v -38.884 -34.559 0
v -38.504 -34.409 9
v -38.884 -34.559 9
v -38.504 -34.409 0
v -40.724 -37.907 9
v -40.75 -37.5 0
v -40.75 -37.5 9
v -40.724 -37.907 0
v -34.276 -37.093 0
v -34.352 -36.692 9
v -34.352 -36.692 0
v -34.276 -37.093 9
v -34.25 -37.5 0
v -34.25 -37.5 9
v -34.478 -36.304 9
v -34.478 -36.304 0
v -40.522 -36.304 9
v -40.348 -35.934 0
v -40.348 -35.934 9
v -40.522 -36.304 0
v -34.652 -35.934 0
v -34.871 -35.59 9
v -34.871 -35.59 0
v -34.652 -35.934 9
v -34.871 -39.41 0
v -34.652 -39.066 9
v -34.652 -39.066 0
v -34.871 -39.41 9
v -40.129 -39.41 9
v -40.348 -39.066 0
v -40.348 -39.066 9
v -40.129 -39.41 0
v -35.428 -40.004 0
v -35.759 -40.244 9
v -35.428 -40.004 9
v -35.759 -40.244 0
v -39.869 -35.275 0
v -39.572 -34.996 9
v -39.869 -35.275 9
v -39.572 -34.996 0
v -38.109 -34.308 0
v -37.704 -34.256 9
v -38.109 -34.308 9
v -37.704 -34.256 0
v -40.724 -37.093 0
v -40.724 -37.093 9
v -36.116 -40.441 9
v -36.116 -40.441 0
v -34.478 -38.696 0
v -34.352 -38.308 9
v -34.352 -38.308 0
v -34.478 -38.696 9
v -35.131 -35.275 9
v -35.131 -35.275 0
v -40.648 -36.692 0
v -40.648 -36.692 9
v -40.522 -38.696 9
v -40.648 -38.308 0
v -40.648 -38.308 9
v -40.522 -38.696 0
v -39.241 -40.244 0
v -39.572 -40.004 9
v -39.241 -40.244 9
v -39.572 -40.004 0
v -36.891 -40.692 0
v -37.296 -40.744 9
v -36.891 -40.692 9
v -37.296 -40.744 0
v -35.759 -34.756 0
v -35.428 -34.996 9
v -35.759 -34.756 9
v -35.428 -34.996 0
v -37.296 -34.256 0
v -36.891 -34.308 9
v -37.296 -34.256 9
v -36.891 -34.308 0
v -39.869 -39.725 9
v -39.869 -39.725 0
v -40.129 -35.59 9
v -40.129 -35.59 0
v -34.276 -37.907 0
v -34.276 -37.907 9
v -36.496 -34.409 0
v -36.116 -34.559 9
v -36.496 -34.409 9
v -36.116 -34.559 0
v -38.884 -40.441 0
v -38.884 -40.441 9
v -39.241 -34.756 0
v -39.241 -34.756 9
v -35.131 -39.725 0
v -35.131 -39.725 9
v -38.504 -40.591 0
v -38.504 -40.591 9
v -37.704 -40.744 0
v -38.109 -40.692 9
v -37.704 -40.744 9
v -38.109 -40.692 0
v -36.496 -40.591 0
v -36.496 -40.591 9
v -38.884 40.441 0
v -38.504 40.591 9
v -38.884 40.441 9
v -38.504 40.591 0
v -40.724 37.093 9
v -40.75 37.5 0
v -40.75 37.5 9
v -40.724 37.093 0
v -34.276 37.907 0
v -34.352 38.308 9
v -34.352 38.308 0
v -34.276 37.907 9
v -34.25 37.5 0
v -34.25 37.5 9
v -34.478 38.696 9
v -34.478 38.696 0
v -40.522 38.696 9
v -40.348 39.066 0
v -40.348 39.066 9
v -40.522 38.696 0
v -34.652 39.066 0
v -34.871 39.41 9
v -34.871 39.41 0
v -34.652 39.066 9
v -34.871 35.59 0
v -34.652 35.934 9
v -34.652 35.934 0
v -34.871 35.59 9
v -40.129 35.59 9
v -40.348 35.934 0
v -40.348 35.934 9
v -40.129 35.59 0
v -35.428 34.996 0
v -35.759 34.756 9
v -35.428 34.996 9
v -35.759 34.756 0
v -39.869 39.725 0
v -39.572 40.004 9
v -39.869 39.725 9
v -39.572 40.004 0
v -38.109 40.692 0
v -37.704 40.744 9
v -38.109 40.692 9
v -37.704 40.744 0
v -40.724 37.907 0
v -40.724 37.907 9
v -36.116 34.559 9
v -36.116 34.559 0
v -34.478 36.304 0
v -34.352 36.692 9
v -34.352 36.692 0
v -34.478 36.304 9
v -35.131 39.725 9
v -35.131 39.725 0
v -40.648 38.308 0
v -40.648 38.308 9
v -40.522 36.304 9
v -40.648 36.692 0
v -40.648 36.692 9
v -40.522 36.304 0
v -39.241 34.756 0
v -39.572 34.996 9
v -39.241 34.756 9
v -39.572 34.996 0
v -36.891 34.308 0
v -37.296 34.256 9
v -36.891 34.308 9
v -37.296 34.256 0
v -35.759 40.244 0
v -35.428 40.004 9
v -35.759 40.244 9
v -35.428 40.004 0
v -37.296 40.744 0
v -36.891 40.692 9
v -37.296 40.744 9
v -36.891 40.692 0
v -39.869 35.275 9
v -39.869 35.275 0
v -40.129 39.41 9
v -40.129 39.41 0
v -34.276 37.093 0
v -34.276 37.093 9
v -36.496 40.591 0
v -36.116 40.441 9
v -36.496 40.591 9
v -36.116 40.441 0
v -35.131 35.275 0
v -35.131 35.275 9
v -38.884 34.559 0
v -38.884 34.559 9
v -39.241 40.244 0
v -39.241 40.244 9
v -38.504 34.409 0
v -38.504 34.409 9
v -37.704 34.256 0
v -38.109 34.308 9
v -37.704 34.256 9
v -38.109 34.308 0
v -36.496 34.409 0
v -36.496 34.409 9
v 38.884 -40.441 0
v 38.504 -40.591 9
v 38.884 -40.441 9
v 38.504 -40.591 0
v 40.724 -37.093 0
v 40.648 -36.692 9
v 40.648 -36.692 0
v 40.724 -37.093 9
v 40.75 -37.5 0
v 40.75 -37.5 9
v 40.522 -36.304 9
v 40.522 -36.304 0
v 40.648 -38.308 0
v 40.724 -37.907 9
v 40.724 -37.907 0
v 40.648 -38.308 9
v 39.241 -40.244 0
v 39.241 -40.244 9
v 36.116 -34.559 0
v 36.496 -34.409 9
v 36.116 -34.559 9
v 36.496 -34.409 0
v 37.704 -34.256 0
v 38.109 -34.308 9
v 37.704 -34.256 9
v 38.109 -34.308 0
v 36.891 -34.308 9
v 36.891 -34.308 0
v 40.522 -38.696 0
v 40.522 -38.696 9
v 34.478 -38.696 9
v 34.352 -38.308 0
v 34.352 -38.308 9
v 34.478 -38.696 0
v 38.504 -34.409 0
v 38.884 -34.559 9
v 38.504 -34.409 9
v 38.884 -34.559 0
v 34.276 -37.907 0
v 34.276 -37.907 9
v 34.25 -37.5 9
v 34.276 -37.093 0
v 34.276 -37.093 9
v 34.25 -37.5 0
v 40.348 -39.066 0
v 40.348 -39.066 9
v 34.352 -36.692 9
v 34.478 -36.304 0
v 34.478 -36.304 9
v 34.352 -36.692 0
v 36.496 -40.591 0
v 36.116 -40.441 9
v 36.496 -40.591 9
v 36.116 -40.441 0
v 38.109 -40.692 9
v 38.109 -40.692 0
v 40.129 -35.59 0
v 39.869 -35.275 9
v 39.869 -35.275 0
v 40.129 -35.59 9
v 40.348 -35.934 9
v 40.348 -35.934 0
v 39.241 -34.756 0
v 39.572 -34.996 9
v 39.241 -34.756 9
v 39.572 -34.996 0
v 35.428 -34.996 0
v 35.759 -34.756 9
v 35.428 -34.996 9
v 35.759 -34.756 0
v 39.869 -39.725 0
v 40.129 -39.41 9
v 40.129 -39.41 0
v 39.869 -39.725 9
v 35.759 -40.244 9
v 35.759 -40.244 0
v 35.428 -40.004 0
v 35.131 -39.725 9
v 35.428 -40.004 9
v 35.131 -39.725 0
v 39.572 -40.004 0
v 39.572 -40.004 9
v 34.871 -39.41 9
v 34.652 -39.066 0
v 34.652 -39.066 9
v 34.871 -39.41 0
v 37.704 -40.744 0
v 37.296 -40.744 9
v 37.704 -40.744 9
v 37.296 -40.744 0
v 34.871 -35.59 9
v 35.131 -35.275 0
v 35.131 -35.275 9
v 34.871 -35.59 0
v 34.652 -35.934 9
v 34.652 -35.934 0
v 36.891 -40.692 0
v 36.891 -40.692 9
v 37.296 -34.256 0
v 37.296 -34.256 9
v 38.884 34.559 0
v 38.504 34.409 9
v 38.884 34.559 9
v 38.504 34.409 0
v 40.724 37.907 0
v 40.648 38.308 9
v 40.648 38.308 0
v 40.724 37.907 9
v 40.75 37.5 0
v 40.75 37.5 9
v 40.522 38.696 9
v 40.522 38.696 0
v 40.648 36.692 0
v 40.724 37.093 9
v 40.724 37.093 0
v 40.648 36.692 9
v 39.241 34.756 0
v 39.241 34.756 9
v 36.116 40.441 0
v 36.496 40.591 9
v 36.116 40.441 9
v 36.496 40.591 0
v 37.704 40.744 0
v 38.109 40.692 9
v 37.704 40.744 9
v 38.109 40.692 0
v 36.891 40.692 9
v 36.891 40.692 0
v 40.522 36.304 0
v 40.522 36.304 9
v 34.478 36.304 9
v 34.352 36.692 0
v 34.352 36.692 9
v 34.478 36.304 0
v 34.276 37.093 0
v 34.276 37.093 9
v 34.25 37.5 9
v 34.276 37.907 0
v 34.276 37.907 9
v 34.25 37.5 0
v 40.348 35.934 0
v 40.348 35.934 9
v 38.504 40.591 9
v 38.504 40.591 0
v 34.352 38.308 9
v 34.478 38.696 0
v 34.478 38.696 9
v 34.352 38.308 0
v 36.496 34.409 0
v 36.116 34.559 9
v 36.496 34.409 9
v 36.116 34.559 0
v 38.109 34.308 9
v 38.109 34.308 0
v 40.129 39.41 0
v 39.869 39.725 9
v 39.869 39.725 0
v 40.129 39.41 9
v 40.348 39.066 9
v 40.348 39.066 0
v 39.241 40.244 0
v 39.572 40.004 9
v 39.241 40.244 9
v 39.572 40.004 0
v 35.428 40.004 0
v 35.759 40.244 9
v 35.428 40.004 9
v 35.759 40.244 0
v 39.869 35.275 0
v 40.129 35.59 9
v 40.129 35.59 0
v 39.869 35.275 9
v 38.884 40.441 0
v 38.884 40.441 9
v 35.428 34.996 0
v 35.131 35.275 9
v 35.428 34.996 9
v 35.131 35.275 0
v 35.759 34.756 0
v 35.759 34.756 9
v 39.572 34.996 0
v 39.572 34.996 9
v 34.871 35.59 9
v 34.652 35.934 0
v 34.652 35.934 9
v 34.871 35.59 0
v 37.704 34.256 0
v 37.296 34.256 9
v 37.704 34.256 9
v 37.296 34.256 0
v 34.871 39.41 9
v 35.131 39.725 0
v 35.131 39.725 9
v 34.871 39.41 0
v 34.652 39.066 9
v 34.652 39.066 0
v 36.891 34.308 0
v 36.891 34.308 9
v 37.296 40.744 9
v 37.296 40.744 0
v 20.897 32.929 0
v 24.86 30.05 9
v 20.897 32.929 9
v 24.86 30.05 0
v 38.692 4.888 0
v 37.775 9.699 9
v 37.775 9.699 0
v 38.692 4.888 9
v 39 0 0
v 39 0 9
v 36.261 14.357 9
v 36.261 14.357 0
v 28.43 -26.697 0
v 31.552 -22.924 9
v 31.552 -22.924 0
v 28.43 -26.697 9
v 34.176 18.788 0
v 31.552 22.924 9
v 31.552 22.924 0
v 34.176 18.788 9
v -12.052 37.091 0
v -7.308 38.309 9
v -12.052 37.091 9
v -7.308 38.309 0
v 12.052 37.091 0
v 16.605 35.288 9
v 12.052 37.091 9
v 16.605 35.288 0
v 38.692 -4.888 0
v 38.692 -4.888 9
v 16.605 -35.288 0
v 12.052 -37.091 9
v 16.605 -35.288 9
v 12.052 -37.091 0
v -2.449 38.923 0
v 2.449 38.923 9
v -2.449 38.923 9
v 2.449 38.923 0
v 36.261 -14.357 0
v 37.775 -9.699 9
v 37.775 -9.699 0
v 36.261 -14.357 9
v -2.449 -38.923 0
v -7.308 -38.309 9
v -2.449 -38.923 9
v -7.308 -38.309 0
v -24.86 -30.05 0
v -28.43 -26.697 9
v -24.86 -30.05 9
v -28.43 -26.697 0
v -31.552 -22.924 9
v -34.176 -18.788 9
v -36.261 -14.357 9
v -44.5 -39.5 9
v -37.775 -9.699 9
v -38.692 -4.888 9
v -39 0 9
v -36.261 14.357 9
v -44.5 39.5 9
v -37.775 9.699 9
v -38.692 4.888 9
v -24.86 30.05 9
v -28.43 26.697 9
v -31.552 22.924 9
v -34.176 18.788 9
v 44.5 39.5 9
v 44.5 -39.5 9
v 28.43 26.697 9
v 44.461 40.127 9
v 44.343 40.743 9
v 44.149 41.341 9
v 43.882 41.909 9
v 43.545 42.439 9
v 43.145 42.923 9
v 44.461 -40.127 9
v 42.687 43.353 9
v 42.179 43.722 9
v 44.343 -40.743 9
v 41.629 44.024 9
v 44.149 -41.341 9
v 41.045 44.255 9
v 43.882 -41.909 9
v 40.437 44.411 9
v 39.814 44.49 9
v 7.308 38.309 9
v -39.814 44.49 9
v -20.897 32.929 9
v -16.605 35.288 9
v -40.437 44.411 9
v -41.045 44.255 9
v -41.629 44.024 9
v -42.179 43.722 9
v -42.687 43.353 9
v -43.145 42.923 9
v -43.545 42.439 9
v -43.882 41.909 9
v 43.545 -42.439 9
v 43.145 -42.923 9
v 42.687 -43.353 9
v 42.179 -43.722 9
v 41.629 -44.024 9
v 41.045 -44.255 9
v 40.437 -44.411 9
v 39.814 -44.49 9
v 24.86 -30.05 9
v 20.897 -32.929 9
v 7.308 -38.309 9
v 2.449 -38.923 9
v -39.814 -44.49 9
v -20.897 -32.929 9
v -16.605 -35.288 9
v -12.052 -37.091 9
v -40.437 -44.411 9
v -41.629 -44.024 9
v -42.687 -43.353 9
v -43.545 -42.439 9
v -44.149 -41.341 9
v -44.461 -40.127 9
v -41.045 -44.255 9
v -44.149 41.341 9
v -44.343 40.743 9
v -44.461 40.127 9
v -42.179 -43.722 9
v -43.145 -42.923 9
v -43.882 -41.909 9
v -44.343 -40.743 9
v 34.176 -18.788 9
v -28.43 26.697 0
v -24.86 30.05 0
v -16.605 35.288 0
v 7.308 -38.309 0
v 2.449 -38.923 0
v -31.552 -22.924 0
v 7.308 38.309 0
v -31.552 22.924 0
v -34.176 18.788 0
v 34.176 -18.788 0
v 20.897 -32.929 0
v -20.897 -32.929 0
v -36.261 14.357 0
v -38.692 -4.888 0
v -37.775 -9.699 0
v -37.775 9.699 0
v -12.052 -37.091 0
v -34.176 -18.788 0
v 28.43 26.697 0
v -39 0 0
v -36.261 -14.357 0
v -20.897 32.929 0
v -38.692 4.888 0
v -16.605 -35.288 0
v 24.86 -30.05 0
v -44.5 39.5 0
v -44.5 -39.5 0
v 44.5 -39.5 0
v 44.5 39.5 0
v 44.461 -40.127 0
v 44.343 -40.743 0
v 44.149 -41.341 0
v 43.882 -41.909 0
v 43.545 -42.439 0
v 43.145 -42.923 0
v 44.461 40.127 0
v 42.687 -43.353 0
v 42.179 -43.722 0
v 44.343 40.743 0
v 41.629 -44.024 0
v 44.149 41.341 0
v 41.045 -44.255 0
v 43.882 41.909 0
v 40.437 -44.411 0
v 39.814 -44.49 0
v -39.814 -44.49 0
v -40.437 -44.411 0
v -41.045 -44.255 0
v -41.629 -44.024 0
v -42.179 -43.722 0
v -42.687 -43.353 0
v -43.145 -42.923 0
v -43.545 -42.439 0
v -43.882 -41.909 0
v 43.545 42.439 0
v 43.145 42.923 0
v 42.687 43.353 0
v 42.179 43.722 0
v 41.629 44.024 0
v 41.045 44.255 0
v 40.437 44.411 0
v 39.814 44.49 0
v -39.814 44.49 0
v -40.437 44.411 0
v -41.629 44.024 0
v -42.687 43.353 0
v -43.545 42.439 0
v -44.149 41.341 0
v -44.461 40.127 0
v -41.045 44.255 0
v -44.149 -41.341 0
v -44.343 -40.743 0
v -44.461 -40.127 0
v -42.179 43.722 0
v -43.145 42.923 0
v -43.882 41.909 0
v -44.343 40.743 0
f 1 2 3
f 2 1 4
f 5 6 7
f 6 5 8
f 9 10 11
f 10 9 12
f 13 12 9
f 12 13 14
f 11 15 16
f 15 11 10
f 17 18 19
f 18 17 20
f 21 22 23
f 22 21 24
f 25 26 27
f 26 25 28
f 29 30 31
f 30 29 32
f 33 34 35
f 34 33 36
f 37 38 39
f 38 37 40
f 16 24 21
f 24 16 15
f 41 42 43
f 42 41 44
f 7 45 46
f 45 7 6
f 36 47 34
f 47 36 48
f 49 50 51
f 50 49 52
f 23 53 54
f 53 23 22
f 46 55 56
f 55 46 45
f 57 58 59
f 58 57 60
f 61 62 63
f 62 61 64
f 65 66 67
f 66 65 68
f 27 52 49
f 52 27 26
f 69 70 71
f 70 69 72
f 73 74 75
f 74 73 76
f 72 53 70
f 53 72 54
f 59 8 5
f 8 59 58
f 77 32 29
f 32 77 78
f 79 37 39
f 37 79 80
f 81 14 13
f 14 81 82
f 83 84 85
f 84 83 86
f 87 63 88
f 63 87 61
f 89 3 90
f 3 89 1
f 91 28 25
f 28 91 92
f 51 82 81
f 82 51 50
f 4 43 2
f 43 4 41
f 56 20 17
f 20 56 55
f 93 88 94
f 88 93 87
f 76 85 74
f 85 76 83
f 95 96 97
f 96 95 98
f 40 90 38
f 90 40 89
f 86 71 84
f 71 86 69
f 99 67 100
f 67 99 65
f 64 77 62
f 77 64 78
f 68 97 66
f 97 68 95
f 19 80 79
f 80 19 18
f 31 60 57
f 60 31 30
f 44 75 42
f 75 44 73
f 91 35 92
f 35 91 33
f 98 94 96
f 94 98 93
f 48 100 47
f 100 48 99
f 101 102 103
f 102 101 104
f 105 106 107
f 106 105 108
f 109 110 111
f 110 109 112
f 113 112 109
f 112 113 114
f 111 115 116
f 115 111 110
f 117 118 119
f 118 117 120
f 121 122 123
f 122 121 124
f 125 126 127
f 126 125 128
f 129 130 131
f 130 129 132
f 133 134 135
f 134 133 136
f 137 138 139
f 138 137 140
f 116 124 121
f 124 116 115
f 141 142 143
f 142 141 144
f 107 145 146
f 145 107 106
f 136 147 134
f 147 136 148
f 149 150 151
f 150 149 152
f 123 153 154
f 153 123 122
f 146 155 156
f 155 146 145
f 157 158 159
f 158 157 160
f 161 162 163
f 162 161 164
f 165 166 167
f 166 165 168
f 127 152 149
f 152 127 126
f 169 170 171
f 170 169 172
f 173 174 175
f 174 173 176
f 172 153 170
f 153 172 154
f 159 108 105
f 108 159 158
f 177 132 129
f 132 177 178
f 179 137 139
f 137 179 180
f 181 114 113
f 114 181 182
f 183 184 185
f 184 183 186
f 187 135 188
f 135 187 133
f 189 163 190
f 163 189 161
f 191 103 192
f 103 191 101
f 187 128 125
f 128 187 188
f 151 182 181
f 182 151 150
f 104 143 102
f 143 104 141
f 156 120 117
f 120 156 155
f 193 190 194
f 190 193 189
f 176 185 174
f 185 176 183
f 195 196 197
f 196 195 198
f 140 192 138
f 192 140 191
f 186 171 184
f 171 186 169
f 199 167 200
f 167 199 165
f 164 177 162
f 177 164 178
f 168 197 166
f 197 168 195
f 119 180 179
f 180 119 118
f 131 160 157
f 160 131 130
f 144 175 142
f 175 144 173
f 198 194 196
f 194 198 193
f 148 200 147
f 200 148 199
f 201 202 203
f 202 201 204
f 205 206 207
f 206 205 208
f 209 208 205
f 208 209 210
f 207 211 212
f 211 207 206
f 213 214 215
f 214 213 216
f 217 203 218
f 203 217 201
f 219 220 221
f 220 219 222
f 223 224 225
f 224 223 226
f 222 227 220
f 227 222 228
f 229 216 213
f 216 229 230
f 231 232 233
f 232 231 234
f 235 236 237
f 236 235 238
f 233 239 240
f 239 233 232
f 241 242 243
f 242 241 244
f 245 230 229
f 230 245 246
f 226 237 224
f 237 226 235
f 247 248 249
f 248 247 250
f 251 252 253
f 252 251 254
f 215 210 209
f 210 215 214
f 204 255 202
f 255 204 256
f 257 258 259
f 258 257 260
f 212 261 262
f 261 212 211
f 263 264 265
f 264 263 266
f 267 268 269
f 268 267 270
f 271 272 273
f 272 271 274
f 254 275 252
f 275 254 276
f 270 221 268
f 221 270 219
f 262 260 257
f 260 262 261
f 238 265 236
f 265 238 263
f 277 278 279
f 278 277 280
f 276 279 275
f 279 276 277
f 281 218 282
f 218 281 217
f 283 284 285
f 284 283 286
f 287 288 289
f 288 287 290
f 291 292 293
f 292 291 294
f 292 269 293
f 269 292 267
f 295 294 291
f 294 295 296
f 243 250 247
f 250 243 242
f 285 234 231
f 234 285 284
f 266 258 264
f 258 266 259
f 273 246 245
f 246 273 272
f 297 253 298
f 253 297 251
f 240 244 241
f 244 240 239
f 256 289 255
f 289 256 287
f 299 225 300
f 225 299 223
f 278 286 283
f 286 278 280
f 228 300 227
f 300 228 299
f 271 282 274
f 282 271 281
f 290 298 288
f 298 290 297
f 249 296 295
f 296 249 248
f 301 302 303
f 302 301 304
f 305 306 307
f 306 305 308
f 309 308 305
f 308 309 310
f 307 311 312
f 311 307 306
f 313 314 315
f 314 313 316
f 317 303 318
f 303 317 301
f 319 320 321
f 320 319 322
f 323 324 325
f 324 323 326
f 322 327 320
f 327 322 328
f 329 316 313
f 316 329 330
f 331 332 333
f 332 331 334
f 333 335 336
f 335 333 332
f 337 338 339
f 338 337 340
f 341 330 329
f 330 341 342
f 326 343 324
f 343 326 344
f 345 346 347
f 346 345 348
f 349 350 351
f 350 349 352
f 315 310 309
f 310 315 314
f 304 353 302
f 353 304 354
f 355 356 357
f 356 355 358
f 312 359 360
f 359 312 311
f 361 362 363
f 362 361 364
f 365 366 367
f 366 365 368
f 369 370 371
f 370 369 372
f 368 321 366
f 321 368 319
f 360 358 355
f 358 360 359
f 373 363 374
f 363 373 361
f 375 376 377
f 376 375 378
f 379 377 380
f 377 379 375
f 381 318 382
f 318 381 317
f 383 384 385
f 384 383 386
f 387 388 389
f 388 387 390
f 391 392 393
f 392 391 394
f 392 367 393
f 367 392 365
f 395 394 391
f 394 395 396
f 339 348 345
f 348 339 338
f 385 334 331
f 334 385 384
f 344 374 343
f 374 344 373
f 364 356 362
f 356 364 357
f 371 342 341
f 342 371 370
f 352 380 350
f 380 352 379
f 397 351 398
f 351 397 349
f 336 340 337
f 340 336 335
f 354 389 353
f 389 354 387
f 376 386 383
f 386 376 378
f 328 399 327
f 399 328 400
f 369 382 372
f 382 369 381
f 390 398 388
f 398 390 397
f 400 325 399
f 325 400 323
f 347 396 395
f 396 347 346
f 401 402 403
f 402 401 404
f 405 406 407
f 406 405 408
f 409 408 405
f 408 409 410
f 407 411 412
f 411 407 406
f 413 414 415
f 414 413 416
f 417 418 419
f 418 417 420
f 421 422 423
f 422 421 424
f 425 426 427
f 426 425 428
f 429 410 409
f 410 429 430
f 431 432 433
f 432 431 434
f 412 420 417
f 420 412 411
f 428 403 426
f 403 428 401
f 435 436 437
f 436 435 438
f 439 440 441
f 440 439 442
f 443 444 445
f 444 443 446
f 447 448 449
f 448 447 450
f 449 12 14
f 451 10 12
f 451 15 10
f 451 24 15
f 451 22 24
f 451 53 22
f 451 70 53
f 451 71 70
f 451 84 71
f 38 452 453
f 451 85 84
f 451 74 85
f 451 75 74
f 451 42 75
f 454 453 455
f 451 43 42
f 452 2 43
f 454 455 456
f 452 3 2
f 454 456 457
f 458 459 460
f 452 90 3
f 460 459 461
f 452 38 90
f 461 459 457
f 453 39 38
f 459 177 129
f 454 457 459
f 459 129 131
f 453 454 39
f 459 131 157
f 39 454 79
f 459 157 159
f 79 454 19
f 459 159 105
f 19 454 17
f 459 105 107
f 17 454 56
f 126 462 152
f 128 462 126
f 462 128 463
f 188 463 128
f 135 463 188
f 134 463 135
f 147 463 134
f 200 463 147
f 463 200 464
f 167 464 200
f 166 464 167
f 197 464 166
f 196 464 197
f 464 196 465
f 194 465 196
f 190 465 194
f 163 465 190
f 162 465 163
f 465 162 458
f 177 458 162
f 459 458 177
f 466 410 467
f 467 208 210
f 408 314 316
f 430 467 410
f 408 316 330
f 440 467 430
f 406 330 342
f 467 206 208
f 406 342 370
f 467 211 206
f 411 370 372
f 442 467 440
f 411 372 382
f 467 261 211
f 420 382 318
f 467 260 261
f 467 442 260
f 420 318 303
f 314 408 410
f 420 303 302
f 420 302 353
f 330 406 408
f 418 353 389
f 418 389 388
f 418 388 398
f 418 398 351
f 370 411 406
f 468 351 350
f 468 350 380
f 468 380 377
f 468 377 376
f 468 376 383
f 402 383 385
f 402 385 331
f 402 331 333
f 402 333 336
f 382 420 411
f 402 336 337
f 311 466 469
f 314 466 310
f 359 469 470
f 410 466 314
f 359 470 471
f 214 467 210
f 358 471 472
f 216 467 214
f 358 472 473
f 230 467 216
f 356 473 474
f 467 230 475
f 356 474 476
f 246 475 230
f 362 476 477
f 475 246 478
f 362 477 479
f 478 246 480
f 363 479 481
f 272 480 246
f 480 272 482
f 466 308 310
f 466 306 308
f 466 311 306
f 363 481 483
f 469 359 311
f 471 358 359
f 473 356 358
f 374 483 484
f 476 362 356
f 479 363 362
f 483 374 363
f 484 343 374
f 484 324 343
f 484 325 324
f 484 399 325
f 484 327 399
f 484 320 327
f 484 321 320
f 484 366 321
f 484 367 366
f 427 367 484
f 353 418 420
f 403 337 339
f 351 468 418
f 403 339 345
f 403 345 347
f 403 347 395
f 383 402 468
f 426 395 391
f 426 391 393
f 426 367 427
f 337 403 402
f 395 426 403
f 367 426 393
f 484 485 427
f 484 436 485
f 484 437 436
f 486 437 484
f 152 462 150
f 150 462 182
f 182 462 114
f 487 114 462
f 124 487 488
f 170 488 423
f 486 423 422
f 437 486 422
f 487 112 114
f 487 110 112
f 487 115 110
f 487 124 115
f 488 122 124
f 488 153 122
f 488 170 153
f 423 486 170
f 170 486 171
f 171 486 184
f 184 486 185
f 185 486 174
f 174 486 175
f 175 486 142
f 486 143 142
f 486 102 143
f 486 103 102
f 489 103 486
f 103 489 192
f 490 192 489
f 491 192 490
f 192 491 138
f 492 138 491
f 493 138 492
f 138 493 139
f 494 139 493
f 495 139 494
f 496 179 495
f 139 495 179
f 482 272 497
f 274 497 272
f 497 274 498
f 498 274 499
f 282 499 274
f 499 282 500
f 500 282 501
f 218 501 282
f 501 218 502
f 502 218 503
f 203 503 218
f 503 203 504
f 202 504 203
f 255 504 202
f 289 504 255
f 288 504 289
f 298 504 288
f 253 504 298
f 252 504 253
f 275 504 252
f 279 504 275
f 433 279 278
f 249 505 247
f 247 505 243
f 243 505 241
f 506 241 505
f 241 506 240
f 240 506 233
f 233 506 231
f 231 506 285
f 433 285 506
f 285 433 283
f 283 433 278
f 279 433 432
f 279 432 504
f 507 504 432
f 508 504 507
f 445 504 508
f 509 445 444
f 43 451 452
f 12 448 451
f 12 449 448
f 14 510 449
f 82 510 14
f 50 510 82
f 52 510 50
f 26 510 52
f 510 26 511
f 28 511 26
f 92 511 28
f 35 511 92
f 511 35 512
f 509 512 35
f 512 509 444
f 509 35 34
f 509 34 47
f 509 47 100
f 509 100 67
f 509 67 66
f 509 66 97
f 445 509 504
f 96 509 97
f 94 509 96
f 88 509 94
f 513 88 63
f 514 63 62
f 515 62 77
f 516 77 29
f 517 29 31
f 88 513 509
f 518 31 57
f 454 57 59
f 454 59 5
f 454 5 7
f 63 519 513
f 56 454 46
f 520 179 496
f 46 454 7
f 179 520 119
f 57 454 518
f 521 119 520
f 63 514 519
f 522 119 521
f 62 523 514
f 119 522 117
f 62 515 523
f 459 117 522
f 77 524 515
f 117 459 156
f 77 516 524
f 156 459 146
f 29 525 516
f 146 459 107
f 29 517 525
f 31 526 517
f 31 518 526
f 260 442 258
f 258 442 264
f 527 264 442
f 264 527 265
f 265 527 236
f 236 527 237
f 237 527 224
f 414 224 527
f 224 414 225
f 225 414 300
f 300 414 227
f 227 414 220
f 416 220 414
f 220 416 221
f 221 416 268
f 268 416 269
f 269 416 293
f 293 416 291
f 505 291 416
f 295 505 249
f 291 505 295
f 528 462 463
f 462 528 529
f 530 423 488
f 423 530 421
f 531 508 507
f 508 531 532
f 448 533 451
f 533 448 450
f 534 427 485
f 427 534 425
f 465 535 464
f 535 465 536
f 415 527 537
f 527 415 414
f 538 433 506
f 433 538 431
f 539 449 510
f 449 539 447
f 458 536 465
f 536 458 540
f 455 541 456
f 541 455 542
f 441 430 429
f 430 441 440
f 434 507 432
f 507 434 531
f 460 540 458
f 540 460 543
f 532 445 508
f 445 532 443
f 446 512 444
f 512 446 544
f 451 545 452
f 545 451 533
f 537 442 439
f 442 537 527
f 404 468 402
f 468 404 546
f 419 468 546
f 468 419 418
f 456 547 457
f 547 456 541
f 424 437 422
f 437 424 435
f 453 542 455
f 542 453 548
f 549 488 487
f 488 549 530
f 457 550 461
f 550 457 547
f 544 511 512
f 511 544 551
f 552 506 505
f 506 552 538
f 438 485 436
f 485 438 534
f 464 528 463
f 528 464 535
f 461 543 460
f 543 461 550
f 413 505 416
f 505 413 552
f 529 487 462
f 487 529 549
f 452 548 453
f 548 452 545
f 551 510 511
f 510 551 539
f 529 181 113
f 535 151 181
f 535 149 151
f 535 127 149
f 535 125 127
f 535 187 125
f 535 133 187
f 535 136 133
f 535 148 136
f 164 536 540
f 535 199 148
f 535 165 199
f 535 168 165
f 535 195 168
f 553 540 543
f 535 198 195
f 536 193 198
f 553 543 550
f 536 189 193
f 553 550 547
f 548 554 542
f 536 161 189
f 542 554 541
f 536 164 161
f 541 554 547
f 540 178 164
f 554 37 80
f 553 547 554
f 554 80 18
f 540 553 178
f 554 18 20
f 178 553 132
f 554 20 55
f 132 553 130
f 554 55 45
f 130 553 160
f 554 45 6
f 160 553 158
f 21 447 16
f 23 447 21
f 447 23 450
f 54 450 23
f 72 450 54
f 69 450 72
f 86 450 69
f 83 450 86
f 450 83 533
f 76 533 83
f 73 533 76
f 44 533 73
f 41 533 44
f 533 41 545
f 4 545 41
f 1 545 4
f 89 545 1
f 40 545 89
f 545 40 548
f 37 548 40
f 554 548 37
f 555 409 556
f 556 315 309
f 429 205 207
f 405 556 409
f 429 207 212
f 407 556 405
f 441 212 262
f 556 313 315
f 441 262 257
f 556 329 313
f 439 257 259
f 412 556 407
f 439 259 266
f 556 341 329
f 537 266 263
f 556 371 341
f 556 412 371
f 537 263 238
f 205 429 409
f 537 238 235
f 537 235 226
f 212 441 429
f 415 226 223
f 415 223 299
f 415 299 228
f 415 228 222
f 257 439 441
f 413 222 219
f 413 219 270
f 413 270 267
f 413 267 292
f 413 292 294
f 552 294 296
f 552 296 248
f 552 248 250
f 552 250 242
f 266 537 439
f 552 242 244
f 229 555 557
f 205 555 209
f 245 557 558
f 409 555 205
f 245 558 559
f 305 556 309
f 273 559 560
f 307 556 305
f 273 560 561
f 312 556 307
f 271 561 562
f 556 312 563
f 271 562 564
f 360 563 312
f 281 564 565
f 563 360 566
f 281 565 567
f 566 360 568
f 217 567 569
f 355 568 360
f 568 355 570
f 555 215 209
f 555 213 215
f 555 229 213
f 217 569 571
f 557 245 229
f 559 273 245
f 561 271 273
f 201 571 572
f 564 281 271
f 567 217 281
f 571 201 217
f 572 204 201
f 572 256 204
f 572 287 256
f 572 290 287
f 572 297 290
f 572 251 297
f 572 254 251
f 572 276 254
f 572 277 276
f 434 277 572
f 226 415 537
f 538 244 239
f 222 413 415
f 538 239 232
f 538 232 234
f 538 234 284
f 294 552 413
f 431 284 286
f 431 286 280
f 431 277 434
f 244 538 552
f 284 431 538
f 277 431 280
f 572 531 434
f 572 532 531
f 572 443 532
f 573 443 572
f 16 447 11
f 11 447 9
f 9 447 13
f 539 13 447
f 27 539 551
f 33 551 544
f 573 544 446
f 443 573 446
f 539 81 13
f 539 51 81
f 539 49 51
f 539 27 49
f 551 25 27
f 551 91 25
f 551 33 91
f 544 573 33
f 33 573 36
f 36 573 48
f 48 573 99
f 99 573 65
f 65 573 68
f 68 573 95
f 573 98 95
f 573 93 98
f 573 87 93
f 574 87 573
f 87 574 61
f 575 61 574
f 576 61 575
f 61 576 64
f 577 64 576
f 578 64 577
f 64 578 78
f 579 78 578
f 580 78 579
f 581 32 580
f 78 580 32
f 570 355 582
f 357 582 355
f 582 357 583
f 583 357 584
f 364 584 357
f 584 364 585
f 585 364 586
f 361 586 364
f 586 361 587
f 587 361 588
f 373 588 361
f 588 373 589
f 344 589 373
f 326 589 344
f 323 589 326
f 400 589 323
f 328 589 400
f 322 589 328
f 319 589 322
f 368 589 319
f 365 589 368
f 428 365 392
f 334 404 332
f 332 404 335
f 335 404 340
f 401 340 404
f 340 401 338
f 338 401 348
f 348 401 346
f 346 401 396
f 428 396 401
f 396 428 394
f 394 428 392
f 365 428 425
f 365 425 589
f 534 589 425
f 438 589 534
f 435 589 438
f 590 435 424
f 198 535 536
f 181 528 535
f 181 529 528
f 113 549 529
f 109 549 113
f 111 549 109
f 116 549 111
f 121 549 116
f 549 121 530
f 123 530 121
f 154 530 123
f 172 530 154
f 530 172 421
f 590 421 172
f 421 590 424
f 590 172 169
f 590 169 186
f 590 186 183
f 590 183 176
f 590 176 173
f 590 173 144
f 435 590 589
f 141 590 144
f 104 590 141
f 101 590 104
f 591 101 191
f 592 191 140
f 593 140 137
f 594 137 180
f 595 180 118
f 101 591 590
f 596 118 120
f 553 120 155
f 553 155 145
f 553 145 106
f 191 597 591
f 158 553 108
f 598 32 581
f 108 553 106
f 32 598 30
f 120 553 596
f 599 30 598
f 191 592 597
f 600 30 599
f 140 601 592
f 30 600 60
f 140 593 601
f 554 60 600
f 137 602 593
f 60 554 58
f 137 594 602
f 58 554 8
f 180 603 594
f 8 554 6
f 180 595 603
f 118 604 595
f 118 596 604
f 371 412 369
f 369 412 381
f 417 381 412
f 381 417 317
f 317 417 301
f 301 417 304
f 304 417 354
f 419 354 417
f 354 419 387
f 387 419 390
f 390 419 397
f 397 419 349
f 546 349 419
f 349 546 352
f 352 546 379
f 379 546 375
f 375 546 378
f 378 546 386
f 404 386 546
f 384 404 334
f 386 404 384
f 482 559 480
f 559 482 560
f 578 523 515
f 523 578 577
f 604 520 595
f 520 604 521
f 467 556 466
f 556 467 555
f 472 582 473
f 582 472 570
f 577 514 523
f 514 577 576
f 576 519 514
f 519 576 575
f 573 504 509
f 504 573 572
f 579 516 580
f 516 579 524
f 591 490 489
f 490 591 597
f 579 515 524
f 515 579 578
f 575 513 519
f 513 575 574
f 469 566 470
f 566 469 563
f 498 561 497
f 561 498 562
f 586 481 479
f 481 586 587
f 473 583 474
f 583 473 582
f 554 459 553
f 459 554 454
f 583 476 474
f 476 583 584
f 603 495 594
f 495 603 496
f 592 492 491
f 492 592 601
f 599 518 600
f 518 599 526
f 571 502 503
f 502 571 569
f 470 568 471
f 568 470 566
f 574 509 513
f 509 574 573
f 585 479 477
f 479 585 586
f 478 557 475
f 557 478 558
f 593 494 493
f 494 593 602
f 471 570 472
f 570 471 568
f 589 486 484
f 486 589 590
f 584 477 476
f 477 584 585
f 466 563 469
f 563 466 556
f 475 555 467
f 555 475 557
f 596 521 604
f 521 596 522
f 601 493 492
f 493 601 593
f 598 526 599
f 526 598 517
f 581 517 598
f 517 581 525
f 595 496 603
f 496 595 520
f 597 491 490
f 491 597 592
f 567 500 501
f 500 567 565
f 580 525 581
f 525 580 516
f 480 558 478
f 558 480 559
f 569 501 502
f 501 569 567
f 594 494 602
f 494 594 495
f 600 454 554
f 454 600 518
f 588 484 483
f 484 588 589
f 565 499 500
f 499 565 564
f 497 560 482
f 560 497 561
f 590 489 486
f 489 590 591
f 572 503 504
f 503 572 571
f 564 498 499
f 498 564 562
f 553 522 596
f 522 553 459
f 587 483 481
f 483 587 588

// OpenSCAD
$fn = 50;

difference() {
	union() {
		hull() {
			translate(v = [-39.5, 39.5, 0]) {
				cylinder(h = 9, r = 5);
			}
			translate(v = [39.5, 39.5, 0]) {
				cylinder(h = 9, r = 5);
			}
			translate(v = [-39.5, -39.5, 0]) {
				cylinder(h = 9, r = 5);
			}
			translate(v = [39.5, -39.5, 0]) {
				cylinder(h = 9, r = 5);
			}
		}
	}
	union() {
		translate(v = [-37.5, -37.5, -100.0]) {
			cylinder(h = 200, r = 3.25);
		}
		translate(v = [-37.5, 37.5, -100.0]) {
			cylinder(h = 200, r = 3.25);
		}
		translate(v = [37.5, -37.5, -100.0]) {
			cylinder(h = 200, r = 3.25);
		}
		translate(v = [37.5, 37.5, -100.0]) {
			cylinder(h = 200, r = 3.25);
		}
		translate(v = [-37.5, -37.5, -100.0]) {
			cylinder(h = 200, r = 1.8);
		}
		translate(v = [-37.5, 37.5, -100.0]) {
			cylinder(h = 200, r = 1.8);
		}
		translate(v = [37.5, -37.5, -100.0]) {
			cylinder(h = 200, r = 1.8);
		}
		translate(v = [37.5, 37.5, -100.0]) {
			cylinder(h = 200, r = 1.8);
		}
		cylinder(h = 9, r = 39.0);
	}
}
